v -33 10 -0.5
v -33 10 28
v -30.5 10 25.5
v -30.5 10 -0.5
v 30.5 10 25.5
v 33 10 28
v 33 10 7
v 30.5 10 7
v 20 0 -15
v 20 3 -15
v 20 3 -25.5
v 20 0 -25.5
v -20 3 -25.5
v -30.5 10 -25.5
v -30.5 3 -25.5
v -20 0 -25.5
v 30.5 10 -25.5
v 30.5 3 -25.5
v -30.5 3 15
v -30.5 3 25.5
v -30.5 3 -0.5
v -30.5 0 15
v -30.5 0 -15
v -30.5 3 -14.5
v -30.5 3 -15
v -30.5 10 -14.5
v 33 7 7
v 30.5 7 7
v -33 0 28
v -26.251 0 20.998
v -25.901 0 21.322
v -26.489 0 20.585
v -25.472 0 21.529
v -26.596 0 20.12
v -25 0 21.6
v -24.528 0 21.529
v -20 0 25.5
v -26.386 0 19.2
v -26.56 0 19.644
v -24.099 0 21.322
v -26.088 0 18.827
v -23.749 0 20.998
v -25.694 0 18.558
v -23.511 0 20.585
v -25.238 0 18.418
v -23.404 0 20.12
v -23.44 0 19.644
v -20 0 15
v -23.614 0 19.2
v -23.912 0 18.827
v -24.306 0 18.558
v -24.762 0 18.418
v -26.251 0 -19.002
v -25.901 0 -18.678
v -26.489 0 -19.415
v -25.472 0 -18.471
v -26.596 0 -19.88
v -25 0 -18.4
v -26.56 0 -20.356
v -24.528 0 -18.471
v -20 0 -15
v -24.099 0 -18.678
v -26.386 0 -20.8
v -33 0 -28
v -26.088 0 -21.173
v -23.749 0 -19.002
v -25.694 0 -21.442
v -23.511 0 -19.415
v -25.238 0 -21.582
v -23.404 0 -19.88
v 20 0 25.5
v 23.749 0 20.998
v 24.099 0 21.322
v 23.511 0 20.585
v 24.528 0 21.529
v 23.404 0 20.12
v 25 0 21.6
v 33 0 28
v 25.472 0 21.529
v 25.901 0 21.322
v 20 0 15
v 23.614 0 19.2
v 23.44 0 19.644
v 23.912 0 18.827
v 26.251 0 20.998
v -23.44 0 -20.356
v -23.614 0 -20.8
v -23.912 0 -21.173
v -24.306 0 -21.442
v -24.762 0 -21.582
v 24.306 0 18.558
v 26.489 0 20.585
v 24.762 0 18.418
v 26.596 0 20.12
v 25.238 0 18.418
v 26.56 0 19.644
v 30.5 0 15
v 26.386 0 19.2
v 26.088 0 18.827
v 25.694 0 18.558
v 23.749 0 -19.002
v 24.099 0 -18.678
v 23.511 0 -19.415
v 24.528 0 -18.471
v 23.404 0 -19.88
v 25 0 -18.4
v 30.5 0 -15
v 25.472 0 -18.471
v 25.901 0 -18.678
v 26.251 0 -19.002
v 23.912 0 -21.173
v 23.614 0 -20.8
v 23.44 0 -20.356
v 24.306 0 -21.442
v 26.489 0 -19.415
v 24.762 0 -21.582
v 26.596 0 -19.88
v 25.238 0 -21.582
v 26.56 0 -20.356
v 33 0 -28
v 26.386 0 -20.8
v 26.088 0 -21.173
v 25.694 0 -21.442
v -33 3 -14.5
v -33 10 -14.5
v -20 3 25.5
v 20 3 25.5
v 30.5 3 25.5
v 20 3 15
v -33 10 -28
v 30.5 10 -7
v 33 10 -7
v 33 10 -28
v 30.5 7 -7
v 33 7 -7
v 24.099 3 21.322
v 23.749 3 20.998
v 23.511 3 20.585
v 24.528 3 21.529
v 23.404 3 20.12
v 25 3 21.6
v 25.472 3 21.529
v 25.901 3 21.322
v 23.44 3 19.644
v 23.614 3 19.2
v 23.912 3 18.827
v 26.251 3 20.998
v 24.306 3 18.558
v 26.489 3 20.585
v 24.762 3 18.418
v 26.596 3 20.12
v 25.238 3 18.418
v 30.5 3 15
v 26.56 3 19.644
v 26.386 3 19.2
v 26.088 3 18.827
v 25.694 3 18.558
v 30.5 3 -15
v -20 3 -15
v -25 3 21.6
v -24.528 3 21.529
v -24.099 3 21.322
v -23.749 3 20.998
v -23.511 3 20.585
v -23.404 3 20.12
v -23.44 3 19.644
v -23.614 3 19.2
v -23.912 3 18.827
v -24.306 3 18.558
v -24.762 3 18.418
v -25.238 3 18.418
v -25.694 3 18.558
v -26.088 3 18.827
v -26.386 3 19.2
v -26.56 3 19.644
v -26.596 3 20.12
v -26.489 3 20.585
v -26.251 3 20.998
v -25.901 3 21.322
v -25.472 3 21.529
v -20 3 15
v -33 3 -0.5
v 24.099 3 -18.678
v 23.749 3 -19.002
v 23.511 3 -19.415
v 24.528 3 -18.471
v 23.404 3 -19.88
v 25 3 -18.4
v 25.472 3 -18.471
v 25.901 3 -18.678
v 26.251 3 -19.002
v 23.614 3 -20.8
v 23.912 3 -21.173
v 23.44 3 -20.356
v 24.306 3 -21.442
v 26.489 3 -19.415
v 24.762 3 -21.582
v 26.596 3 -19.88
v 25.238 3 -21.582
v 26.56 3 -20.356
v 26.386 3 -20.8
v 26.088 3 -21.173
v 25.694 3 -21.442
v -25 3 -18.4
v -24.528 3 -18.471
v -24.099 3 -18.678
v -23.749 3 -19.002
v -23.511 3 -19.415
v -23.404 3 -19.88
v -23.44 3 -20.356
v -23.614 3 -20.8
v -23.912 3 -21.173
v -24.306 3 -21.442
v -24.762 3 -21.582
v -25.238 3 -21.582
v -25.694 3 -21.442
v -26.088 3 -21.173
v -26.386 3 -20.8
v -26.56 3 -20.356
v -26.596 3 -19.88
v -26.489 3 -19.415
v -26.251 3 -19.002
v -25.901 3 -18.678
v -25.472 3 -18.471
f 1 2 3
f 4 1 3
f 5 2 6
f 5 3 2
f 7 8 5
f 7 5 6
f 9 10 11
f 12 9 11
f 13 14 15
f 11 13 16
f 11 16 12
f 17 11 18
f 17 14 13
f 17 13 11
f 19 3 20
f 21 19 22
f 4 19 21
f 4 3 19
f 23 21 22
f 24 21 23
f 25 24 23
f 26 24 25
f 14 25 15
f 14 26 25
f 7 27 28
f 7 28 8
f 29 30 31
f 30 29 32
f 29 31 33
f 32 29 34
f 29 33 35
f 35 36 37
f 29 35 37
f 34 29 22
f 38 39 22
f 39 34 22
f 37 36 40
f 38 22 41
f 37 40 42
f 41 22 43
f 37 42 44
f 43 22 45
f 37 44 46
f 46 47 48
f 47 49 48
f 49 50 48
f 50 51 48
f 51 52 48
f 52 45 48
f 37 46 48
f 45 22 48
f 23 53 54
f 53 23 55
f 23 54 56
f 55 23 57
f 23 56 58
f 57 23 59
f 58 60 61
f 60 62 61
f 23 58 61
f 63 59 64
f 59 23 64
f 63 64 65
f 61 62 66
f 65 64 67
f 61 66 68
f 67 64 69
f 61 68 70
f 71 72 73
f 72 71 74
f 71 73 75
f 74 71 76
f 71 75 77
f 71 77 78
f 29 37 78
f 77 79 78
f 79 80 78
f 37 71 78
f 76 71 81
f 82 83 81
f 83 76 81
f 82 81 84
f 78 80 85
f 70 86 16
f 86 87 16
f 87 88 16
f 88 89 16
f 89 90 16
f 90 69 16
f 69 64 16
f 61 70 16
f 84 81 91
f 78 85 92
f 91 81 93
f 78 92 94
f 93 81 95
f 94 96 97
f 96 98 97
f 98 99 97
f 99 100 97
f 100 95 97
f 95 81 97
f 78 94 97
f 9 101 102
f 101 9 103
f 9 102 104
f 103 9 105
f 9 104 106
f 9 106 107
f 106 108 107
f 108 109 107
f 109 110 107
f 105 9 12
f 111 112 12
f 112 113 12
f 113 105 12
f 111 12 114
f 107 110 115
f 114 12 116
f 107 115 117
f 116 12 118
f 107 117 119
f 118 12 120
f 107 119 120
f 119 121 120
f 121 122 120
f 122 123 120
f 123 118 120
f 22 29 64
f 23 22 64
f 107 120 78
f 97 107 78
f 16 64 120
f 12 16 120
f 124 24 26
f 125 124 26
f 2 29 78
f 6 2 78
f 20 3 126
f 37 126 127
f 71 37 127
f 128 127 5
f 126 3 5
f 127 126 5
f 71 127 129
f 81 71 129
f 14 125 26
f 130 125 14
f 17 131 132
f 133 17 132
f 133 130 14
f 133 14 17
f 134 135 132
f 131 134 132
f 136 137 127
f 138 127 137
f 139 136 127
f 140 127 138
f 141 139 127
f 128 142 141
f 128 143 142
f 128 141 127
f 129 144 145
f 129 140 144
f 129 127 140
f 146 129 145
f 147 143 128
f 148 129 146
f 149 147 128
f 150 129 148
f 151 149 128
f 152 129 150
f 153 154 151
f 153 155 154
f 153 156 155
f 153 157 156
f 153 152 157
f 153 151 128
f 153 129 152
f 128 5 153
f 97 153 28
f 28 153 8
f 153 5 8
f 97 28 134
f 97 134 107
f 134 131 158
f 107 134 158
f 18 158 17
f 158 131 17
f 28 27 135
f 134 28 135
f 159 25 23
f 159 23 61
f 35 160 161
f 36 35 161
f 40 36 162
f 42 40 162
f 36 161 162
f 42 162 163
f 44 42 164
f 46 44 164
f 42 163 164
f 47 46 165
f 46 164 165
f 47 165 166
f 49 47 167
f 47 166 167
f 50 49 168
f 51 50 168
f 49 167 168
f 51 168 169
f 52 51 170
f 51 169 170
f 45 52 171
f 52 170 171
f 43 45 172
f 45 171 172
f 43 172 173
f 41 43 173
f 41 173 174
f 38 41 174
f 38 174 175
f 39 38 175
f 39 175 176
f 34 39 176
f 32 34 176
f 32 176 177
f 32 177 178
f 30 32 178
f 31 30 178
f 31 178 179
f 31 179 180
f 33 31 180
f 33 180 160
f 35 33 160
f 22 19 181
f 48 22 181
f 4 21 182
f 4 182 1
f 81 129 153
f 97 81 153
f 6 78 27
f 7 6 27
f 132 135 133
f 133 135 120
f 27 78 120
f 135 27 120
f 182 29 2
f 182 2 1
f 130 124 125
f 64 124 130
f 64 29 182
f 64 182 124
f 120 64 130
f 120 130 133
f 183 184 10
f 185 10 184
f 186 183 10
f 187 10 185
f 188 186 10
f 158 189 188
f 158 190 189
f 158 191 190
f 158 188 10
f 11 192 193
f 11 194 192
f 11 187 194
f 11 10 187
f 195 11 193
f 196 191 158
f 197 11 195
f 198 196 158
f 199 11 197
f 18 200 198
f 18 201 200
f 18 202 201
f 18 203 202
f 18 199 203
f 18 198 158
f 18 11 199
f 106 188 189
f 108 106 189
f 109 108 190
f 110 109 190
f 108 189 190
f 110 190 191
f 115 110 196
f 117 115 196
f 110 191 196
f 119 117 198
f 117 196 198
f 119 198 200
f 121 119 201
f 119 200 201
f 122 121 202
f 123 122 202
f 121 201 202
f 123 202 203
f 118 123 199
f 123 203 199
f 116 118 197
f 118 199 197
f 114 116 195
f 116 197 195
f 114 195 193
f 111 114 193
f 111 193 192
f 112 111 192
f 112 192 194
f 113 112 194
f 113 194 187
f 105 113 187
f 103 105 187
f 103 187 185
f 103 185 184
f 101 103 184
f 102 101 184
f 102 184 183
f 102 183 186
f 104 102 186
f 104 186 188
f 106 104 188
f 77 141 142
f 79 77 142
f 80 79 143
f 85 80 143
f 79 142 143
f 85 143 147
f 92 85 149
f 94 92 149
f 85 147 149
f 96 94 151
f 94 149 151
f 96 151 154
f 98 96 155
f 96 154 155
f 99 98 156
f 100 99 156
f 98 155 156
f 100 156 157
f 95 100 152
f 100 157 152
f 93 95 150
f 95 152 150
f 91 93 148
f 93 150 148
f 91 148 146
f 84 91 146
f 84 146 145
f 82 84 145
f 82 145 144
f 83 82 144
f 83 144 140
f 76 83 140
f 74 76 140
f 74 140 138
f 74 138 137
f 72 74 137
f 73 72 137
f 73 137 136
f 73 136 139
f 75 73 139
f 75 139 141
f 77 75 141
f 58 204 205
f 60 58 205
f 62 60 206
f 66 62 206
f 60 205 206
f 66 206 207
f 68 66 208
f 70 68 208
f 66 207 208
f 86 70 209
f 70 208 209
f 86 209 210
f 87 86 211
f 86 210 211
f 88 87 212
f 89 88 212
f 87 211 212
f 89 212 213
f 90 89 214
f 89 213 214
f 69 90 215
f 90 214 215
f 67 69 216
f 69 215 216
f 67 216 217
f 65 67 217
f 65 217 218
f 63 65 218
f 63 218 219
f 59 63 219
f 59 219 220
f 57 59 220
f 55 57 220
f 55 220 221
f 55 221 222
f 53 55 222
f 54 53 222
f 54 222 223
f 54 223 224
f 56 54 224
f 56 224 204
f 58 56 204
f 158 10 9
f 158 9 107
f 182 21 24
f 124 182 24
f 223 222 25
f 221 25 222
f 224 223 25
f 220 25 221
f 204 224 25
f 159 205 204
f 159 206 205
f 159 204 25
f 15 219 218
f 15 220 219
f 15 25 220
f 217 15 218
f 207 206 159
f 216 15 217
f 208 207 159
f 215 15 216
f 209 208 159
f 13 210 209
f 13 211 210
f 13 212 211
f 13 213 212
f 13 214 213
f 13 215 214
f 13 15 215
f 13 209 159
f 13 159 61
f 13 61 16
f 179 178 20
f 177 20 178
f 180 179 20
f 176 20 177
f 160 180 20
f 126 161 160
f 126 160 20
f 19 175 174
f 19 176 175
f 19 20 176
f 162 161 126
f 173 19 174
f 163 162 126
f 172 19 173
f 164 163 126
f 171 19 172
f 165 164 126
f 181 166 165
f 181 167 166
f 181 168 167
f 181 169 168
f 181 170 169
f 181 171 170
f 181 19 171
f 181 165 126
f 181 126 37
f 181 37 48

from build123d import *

# Parameters (mm, degrees)
SKETCH_1_W                  = 66
SKETCH_1_H                  = 56
EXTRUDE_1_DEPTH             = 10
SKETCH_2_W                  = 61
SKETCH_2_H                  = 51
CUT_EXTRUDE_1_DEPTH         = 7
SKETCH_3_R                  = 1.6
CUT_EXTRUDE_2_DEPTH         = 44.840620434
PATTERN_LINEAR_1_COUNT      = 2
PATTERN_LINEAR_1_PITCH      = 50
PATTERN_LINEAR_1_COUNT_DIR2 = 2
PATTERN_LINEAR_1_PITCH_DIR2 = 40
SKETCH_4_W                  = 40
SKETCH_4_H                  = 10.5
SKETCH_4_W_2                = 10.5
SKETCH_4_H_2                = 30
CUT_EXTRUDE_3_DEPTH         = 44.840620434
SKETCH_6_W                  = 14
SKETCH_6_H                  = 7
CUT_EXTRUDE_6_DEPTH         = 10
SKETCH_7_W                  = 14
SKETCH_7_H                  = 3
CUT_EXTRUDE_7_DEPTH         = 10


with BuildPart() as part:
    # 草图1 → 凸台-拉伸1 (new body)
    with BuildSketch(Plane(origin=(0, 0, 0), x_dir=(1, 0, 0), z_dir=(0, 1, 0))):
        Rectangle(SKETCH_1_W, SKETCH_1_H)
    extrude(amount=EXTRUDE_1_DEPTH)

    # 草图2 → 切除-拉伸1 (cut)
    with BuildSketch(Plane(origin=(0, 10, 0), x_dir=(1, 0, 0), z_dir=(0, 1, 0))):
        Rectangle(SKETCH_2_W, SKETCH_2_H)
    extrude(amount=-CUT_EXTRUDE_1_DEPTH, mode=Mode.SUBTRACT)

    # 草图3 → 切除-拉伸2 (cut, through all)
    with BuildSketch(Plane(origin=(0, 3, 0), x_dir=(1, 0, 0), z_dir=(0, 1, 0))):
        with Locations(Location((-25, 20, 0), (0, 0, 270))):
            Circle(SKETCH_3_R)
    cut_extrude_2 = extrude(amount=-CUT_EXTRUDE_2_DEPTH, mode=Mode.SUBTRACT)

    # 阵列(线性)1: Cut-Extrude 2 2 × 2
    with Locations(*[(i * PATTERN_LINEAR_1_PITCH, 0, j * PATTERN_LINEAR_1_PITCH_DIR2) for i in range(PATTERN_LINEAR_1_COUNT) for j in range(PATTERN_LINEAR_1_COUNT_DIR2) if (i, j) != (0, 0)]):
        add(cut_extrude_2, mode=Mode.SUBTRACT)

    # 草图4 → 切除-拉伸3 (cut, through all)
    with BuildSketch(Plane(origin=(0, 3, 0), x_dir=(1, 0, 0), z_dir=(0, 1, 0))):
        with Locations((0, 20.25)):
            Rectangle(SKETCH_4_W, SKETCH_4_H)
        with Locations((-25.25, 0)):
            Rectangle(SKETCH_4_W_2, SKETCH_4_H_2)
        Rectangle(SKETCH_4_W, SKETCH_4_H_2)
        with Locations((0, -20.25)):
            Rectangle(SKETCH_4_W, SKETCH_4_H)
        with Locations((25.25, 0)):
            Rectangle(SKETCH_4_W_2, SKETCH_4_H_2)
    extrude(amount=-CUT_EXTRUDE_3_DEPTH, mode=Mode.SUBTRACT)

    # 草图6 → 切除-拉伸6 (cut)
    with BuildSketch(Plane(origin=(-30.5, 0, 0), x_dir=(0, 0, -1), z_dir=(1, 0, 0))):
        with Locations((7.5, 6.5)):
            Rectangle(SKETCH_6_W, SKETCH_6_H)
    extrude(amount=-CUT_EXTRUDE_6_DEPTH, mode=Mode.SUBTRACT)

    # 草图7 → 切除-拉伸7 (cut)
    with BuildSketch(Plane(origin=(33, 0, 0), x_dir=(0, 0, -1), z_dir=(1, 0, 0))):
        with Locations((0, 8.5)):
            Rectangle(SKETCH_7_W, SKETCH_7_H)
    extrude(amount=-CUT_EXTRUDE_7_DEPTH, mode=Mode.SUBTRACT)


solid = part.part
